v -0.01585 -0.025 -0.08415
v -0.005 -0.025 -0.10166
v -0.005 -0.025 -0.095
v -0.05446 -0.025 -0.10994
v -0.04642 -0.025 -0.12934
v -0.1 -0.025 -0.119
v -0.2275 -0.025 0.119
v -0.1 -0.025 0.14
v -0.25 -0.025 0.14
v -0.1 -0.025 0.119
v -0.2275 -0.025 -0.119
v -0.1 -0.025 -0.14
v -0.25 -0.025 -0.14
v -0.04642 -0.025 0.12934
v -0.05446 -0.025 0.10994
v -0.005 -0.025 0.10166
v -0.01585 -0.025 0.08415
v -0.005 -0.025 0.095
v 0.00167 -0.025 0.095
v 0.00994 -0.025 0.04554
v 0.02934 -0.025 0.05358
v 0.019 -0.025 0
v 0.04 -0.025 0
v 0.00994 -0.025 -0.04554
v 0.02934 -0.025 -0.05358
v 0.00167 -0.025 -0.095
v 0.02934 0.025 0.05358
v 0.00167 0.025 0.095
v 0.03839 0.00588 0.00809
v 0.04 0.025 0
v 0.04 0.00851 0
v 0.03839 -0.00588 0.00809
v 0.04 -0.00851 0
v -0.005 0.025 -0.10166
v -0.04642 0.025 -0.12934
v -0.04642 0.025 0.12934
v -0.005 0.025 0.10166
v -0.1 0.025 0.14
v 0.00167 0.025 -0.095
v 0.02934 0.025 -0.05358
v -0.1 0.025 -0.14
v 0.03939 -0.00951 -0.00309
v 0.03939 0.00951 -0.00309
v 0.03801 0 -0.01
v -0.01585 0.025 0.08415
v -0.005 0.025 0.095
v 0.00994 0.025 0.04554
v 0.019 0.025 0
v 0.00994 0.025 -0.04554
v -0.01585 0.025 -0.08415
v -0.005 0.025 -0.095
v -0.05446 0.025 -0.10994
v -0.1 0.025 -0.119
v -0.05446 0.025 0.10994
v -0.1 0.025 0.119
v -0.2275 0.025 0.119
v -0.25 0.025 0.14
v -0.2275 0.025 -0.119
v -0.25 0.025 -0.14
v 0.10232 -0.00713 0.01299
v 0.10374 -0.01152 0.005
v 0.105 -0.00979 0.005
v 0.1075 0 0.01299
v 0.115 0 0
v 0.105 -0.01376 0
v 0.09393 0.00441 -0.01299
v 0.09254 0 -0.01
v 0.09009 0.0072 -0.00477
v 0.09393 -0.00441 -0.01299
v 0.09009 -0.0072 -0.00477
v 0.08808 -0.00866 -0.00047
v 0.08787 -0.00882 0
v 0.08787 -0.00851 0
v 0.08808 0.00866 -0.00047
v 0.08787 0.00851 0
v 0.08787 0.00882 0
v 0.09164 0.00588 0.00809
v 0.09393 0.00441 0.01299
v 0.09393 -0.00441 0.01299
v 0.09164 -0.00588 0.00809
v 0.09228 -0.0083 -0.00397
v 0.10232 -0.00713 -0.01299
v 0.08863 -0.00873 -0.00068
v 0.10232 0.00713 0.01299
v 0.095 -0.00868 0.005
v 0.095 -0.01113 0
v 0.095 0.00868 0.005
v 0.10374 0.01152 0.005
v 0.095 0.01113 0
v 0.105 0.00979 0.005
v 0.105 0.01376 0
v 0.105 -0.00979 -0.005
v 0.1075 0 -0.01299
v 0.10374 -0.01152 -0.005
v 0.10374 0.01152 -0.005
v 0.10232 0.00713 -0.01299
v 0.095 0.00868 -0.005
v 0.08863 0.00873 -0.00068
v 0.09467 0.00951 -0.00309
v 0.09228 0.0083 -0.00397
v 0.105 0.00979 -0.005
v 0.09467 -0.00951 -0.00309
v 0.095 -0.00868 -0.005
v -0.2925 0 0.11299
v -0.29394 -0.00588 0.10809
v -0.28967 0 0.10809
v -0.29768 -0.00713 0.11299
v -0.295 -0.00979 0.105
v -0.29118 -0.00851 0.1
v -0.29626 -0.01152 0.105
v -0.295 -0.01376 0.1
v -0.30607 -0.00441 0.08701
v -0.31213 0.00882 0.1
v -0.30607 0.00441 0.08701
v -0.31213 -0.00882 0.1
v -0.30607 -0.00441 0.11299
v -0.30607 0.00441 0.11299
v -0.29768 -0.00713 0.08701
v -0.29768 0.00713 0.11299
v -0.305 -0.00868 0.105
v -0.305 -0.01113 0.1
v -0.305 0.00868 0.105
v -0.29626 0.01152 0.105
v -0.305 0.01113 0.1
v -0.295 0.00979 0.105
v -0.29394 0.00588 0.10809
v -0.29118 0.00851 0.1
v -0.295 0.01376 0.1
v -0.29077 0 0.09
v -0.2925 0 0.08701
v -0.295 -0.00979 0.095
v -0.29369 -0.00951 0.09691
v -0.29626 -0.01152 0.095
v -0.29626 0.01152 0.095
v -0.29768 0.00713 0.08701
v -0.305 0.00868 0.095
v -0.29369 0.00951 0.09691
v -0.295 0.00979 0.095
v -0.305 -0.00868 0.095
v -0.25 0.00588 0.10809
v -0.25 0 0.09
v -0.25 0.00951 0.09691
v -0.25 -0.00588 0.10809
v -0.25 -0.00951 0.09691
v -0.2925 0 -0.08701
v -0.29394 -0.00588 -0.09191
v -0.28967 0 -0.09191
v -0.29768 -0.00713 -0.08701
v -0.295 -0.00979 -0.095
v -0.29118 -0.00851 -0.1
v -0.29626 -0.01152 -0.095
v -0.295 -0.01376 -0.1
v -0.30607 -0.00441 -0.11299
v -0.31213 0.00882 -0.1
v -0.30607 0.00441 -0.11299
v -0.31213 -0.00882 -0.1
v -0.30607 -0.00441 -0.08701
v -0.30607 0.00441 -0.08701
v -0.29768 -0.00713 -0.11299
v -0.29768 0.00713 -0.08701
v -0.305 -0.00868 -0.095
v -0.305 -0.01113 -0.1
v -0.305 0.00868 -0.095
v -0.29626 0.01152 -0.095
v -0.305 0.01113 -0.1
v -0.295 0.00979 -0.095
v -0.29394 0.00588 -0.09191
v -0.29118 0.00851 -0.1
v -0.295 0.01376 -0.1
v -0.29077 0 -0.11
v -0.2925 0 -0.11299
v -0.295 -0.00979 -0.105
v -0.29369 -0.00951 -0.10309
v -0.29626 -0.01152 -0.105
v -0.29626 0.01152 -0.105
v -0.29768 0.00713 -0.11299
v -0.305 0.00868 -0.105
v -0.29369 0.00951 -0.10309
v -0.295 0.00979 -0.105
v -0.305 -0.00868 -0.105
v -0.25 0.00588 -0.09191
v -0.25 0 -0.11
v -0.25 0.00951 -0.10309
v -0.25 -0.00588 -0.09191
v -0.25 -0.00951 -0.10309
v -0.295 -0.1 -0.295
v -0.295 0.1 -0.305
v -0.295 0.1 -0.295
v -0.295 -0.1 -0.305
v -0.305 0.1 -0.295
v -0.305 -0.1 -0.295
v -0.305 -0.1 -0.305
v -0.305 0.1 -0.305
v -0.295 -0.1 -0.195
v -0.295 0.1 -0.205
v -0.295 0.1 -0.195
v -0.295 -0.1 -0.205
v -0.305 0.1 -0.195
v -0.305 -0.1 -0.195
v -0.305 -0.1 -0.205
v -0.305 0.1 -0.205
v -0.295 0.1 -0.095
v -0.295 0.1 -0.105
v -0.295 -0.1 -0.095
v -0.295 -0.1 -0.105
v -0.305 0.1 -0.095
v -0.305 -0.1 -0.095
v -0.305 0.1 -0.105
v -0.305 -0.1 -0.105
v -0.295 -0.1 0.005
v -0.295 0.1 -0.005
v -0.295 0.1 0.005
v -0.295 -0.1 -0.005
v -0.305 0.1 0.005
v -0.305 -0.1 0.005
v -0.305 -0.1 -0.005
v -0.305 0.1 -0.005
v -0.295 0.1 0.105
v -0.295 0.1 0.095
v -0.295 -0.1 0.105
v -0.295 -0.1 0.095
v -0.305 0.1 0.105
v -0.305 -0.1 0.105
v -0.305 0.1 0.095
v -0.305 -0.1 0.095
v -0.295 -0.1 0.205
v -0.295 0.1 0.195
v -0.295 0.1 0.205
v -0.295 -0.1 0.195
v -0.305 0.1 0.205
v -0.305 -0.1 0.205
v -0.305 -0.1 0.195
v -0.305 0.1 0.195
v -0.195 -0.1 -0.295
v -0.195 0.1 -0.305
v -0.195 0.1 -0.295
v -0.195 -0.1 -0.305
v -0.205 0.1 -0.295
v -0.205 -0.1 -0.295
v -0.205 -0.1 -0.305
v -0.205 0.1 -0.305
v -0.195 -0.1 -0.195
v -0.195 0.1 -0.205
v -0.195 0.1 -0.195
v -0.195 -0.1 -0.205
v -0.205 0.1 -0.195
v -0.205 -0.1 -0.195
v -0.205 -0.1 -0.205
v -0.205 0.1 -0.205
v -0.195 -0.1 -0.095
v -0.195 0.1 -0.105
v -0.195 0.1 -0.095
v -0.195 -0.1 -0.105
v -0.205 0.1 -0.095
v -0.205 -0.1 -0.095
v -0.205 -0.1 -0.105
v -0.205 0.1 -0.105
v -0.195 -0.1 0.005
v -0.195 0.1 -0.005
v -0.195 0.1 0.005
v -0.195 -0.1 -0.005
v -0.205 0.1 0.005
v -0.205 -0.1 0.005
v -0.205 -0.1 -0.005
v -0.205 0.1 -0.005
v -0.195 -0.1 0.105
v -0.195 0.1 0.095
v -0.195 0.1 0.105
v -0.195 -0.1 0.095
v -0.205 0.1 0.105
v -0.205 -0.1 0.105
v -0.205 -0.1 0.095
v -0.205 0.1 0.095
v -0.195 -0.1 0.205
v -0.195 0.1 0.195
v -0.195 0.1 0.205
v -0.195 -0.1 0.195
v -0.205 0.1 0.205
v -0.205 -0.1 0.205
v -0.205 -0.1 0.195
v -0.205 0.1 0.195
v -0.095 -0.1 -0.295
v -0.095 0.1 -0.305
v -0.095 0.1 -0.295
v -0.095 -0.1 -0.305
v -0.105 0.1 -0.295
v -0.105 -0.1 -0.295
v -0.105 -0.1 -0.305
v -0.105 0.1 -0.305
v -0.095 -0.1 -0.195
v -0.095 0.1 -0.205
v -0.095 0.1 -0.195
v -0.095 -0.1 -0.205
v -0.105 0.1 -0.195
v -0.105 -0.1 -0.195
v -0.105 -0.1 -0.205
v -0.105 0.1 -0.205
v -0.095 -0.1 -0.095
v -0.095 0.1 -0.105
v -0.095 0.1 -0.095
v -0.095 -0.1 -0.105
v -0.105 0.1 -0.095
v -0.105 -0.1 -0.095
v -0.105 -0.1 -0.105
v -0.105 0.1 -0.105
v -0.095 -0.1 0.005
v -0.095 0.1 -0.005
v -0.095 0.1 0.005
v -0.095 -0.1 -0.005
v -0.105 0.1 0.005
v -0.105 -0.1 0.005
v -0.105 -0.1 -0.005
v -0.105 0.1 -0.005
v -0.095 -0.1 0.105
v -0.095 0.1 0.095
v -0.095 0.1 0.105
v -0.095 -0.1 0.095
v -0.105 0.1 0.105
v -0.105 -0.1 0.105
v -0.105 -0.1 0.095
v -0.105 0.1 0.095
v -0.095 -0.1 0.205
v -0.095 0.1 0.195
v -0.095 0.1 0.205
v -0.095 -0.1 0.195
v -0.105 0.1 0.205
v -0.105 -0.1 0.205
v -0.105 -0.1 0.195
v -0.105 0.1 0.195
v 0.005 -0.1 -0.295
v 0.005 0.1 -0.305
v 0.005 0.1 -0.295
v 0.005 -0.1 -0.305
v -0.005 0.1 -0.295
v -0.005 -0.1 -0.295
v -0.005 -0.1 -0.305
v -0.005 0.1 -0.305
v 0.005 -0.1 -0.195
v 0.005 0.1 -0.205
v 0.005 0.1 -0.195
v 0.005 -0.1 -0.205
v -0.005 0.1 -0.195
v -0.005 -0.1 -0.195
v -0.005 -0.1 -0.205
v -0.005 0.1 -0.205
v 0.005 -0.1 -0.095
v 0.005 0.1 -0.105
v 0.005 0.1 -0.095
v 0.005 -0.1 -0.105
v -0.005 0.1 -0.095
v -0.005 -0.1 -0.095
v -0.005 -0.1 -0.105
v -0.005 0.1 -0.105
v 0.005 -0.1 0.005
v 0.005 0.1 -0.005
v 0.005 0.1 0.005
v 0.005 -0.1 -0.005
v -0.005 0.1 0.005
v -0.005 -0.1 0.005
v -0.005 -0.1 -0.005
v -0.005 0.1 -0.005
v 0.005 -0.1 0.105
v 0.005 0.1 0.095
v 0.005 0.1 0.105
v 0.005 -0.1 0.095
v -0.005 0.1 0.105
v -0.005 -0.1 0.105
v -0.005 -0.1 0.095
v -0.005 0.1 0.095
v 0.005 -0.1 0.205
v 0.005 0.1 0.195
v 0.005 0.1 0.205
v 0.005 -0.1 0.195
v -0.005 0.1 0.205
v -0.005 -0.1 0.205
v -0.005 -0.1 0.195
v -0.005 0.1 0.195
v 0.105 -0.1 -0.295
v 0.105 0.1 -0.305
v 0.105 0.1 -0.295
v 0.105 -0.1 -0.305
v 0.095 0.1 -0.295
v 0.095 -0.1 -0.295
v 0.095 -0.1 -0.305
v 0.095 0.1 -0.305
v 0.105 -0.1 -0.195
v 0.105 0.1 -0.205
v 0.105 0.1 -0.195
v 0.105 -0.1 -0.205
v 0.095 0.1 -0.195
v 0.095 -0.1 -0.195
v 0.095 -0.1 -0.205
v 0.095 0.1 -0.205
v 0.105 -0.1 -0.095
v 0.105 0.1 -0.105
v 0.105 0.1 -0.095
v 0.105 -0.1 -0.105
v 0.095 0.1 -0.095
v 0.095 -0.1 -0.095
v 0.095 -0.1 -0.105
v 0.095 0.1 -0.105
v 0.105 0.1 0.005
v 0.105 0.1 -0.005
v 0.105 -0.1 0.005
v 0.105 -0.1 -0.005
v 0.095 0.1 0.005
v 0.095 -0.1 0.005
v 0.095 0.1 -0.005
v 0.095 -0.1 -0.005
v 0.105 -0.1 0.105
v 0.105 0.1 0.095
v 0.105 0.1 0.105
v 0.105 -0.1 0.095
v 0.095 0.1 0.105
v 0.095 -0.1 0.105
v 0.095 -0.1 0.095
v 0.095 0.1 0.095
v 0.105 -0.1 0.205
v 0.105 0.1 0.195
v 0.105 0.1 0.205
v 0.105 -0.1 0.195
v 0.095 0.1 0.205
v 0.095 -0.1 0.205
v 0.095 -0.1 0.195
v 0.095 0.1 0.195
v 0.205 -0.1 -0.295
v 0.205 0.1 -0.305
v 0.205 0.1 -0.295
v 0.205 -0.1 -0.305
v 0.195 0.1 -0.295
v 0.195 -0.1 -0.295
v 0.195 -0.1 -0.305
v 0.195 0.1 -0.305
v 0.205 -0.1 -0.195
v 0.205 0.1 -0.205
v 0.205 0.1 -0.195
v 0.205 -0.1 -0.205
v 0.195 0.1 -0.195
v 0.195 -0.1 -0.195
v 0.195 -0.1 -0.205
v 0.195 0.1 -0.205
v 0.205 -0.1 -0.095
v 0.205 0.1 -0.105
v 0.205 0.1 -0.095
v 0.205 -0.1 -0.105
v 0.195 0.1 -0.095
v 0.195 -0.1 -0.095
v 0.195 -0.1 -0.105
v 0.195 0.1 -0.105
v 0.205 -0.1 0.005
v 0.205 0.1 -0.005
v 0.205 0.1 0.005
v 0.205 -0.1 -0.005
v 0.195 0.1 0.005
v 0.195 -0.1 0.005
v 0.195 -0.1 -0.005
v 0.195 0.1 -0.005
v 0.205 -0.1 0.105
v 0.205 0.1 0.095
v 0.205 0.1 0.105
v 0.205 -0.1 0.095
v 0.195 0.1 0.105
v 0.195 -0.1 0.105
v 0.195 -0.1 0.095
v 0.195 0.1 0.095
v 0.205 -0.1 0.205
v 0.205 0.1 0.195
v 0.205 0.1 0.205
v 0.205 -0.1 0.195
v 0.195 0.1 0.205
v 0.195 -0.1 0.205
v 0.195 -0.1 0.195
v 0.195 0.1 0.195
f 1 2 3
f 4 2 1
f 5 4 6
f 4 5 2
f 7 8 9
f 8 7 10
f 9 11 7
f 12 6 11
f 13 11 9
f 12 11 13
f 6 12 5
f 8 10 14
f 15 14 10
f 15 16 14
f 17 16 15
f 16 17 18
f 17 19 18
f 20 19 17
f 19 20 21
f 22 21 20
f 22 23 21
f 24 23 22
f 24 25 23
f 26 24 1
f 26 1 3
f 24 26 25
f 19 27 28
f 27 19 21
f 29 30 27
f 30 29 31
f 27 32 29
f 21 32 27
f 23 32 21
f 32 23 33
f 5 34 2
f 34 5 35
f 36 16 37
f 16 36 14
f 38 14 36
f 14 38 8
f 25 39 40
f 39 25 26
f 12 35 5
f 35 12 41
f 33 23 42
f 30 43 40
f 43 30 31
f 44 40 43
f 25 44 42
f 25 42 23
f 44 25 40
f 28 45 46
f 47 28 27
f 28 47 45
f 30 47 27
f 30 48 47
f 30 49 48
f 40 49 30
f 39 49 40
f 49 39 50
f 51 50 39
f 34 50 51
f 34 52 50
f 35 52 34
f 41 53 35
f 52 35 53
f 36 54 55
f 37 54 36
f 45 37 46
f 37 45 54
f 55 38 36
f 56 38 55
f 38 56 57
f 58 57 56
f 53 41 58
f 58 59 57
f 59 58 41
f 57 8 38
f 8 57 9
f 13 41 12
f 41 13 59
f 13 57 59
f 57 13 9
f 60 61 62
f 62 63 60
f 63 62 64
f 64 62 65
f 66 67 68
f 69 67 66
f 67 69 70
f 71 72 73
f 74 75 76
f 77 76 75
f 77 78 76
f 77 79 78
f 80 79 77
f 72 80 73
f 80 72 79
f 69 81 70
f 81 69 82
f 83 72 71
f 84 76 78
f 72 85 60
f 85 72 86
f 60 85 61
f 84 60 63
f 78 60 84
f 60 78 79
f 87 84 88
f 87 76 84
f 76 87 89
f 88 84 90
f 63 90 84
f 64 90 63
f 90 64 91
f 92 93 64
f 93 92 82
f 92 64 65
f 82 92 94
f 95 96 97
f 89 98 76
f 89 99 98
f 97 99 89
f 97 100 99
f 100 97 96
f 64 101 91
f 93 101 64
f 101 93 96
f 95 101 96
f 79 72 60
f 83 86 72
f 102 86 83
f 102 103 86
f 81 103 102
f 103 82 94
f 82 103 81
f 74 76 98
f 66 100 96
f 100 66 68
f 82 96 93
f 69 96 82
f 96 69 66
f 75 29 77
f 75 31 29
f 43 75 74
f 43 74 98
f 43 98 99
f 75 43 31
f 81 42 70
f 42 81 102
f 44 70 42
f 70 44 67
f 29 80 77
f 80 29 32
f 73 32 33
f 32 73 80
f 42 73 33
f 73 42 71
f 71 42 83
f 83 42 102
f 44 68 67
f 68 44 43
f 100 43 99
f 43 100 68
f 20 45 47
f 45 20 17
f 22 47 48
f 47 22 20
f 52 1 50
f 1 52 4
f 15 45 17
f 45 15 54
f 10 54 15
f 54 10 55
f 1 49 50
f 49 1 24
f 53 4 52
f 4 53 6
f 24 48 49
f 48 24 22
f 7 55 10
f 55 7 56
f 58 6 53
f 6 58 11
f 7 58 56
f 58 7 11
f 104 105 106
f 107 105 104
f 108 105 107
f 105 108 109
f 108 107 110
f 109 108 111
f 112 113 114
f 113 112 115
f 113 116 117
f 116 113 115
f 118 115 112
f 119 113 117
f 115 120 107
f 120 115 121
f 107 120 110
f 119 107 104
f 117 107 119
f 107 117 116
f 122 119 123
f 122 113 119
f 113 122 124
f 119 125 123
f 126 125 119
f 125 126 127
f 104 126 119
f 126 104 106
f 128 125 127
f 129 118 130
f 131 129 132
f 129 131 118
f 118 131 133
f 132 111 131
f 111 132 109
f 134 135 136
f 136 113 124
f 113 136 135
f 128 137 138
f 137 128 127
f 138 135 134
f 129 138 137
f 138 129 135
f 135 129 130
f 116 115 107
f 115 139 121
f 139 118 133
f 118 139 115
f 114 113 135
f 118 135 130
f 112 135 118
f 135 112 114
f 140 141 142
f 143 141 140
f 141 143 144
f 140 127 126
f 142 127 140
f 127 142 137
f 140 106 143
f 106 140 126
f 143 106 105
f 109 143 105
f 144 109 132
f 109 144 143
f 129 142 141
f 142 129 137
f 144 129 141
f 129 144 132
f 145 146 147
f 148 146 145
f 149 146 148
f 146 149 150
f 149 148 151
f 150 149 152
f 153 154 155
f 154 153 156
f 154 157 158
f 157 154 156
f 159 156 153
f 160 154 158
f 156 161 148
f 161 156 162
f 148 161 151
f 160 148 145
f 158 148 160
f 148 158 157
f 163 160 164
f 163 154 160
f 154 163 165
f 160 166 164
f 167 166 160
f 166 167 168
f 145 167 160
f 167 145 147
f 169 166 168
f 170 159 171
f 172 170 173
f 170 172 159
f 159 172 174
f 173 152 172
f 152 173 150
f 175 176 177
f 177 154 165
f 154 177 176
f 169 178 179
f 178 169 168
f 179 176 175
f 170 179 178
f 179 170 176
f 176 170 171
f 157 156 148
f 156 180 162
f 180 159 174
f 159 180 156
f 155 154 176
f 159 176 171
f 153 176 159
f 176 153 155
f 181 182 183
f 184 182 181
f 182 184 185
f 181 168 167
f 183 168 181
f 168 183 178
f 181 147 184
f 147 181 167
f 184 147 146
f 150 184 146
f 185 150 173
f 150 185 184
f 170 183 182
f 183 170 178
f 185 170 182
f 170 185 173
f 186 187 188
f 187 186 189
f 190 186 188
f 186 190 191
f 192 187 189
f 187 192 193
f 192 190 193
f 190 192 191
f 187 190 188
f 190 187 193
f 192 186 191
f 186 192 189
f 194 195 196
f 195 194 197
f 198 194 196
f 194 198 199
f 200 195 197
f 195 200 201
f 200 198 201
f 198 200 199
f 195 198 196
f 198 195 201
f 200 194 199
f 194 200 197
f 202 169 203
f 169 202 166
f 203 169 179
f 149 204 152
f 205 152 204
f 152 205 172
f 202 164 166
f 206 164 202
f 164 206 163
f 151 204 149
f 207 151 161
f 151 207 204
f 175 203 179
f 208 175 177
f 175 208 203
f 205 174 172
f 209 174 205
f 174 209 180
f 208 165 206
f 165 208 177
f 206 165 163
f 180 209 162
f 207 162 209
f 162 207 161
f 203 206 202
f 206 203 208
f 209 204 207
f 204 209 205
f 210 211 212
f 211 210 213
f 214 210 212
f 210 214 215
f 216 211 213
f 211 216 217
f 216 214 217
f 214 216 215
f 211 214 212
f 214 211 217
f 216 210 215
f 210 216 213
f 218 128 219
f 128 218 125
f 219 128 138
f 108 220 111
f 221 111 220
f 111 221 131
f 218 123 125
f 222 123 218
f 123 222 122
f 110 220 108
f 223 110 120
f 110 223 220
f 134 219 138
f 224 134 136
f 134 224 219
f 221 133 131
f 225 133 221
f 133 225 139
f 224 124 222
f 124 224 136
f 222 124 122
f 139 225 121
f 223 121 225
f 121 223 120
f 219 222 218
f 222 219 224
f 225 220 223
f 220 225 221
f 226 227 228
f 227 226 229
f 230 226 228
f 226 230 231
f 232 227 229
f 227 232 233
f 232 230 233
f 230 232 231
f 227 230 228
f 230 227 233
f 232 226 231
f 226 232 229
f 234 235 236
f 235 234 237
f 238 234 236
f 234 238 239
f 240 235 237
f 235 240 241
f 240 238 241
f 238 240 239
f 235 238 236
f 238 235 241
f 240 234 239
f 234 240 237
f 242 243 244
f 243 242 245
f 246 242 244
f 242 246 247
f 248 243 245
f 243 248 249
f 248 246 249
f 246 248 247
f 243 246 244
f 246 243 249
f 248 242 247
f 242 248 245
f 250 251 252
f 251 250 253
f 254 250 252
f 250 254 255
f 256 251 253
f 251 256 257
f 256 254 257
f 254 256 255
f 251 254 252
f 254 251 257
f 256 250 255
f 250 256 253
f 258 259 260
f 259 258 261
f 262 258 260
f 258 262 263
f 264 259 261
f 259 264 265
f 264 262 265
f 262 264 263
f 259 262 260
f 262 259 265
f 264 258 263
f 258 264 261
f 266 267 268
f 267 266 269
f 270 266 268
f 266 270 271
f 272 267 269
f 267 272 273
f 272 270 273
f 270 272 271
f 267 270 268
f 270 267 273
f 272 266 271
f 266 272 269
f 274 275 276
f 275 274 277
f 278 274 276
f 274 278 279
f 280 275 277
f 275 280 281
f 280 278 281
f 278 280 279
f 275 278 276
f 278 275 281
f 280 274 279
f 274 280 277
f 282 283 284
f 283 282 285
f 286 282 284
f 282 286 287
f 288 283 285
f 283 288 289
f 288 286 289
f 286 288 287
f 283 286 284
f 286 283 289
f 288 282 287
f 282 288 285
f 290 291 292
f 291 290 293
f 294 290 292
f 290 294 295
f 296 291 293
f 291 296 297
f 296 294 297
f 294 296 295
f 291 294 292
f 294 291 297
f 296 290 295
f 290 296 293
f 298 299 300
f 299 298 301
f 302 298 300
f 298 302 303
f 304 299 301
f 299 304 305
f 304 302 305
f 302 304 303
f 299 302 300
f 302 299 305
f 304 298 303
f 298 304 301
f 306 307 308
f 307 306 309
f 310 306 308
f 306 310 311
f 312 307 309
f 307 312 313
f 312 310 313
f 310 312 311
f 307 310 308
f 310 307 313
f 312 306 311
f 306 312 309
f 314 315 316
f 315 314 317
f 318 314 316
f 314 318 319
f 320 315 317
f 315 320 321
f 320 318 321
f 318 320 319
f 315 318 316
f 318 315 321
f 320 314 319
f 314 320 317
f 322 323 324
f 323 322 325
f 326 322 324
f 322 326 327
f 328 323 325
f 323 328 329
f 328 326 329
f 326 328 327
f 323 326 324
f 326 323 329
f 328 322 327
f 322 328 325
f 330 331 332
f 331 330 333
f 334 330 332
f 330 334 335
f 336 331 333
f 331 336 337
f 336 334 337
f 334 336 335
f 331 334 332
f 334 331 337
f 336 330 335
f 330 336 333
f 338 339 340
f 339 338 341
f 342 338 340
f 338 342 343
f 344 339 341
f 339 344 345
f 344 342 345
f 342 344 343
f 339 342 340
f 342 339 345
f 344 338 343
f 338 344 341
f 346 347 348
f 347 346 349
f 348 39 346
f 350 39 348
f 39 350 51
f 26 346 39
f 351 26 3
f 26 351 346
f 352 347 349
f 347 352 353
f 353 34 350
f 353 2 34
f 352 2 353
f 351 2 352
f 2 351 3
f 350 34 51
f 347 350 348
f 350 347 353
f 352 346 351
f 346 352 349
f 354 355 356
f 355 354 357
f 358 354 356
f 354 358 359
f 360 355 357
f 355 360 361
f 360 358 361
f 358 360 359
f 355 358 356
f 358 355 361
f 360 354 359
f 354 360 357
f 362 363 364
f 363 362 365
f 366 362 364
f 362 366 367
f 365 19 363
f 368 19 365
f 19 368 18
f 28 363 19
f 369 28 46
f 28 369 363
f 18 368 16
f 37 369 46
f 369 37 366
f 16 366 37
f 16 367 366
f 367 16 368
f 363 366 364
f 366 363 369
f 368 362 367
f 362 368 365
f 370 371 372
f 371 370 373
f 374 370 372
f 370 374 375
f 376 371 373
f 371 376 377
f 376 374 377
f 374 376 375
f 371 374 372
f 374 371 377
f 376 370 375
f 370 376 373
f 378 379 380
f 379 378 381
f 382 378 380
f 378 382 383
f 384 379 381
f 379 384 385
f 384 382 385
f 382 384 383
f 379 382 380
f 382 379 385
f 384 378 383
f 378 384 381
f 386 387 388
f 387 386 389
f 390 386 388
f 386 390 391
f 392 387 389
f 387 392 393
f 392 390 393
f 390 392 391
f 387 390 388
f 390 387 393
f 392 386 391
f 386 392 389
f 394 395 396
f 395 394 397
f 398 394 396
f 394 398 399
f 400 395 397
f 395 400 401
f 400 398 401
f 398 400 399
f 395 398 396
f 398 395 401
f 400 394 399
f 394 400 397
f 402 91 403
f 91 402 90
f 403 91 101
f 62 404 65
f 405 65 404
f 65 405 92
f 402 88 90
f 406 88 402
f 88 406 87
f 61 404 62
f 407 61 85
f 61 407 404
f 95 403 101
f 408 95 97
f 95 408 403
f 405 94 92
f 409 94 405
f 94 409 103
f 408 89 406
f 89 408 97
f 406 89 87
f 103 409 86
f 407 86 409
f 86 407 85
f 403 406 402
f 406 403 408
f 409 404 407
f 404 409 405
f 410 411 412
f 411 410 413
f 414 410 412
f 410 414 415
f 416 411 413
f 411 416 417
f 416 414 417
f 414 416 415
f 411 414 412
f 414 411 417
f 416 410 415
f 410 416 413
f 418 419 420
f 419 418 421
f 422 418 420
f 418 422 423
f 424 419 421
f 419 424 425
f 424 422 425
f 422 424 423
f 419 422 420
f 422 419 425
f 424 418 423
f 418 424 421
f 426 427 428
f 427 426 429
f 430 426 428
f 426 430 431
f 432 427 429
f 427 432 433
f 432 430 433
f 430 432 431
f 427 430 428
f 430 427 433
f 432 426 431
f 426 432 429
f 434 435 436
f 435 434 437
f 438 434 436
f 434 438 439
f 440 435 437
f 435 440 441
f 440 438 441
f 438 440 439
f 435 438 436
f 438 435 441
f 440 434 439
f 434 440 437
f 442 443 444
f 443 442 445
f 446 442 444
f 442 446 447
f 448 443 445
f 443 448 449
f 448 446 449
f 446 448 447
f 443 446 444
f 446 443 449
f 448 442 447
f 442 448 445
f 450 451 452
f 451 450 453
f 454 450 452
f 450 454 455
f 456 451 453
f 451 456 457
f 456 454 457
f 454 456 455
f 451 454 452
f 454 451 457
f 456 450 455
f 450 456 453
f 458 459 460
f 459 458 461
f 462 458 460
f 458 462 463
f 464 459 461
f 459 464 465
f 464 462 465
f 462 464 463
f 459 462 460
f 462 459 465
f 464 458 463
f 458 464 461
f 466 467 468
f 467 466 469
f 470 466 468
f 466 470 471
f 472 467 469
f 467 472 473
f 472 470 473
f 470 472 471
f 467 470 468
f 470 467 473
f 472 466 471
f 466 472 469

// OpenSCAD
// file: common.scad
grid_size = 0.1;
wire_radius = 0.01;

module place_cuboid(low_x, high_x, low_y, high_y, low_z, high_z) {
    translate([low_x, low_y, low_z]) {
        cube([high_x - low_x, high_y - low_y, high_z - low_z], false);
    };
}

module debug_grid() {
    for (x = [-3,-2,-1,0,1,2]) {
        for (z = [-3,-2,-1,0,1,2]) {
            place_cuboid(x * grid_size - 0.005, x * grid_size + 0.005,
                         -grid_size, grid_size,
                         z * grid_size - 0.005, z * grid_size + 0.005);
        }
    }
}
// main file
include <common.scad>


module and_body() {
    intersection() {
        place_cuboid(-grid_size, grid_size * 1.5, -grid_size, grid_size, grid_size * -1.4, grid_size * 1.4);
        translate([-grid_size, 0, 0]) {
            rotate([90, 0, 0]) {
                cylinder(grid_size / 2, r1=grid_size * 1.4, r2=grid_size * 1.4, center=true, $fn=16);
            }
        }
    }
    place_cuboid(grid_size * -2.5, grid_size * -1,
                 -grid_size / 4, grid_size / 4,
                 grid_size * -1.4, grid_size * 1.4);

}

module main() {
    union() {
        difference() {
            union() {
                // body
                and_body();
                // output
                translate([grid_size, 0, 0]) {
                    sphere(r=wire_radius*1.5);
                    rotate([0, -90, 0]) {
                        rotate([0, 0, 180]) {
                            cylinder(grid_size, r1=wire_radius, r2=wire_radius);
                        }
                    }
                }
            }
            // subtract out the center of the body
            translate([-grid_size * 0.15, 0, 0]) {
                scale([0.85, 1.1, 0.85]) {
                    and_body();
                }
            }
        }

        // inputs
        translate([grid_size * -3, 0, grid_size]) {
            sphere(r=wire_radius*1.5);
            rotate([0, 90, 0]) {
                cylinder(grid_size / 2, r1=wire_radius, r2=wire_radius);
            }
        }
        translate([grid_size * -3, 0, -grid_size]) {
            sphere(r=wire_radius*1.5);
            rotate([0, 90, 0]) {
                cylinder(grid_size / 2, r1=wire_radius, r2=wire_radius);
            }
        }
    }
}

main();
debug_grid();
